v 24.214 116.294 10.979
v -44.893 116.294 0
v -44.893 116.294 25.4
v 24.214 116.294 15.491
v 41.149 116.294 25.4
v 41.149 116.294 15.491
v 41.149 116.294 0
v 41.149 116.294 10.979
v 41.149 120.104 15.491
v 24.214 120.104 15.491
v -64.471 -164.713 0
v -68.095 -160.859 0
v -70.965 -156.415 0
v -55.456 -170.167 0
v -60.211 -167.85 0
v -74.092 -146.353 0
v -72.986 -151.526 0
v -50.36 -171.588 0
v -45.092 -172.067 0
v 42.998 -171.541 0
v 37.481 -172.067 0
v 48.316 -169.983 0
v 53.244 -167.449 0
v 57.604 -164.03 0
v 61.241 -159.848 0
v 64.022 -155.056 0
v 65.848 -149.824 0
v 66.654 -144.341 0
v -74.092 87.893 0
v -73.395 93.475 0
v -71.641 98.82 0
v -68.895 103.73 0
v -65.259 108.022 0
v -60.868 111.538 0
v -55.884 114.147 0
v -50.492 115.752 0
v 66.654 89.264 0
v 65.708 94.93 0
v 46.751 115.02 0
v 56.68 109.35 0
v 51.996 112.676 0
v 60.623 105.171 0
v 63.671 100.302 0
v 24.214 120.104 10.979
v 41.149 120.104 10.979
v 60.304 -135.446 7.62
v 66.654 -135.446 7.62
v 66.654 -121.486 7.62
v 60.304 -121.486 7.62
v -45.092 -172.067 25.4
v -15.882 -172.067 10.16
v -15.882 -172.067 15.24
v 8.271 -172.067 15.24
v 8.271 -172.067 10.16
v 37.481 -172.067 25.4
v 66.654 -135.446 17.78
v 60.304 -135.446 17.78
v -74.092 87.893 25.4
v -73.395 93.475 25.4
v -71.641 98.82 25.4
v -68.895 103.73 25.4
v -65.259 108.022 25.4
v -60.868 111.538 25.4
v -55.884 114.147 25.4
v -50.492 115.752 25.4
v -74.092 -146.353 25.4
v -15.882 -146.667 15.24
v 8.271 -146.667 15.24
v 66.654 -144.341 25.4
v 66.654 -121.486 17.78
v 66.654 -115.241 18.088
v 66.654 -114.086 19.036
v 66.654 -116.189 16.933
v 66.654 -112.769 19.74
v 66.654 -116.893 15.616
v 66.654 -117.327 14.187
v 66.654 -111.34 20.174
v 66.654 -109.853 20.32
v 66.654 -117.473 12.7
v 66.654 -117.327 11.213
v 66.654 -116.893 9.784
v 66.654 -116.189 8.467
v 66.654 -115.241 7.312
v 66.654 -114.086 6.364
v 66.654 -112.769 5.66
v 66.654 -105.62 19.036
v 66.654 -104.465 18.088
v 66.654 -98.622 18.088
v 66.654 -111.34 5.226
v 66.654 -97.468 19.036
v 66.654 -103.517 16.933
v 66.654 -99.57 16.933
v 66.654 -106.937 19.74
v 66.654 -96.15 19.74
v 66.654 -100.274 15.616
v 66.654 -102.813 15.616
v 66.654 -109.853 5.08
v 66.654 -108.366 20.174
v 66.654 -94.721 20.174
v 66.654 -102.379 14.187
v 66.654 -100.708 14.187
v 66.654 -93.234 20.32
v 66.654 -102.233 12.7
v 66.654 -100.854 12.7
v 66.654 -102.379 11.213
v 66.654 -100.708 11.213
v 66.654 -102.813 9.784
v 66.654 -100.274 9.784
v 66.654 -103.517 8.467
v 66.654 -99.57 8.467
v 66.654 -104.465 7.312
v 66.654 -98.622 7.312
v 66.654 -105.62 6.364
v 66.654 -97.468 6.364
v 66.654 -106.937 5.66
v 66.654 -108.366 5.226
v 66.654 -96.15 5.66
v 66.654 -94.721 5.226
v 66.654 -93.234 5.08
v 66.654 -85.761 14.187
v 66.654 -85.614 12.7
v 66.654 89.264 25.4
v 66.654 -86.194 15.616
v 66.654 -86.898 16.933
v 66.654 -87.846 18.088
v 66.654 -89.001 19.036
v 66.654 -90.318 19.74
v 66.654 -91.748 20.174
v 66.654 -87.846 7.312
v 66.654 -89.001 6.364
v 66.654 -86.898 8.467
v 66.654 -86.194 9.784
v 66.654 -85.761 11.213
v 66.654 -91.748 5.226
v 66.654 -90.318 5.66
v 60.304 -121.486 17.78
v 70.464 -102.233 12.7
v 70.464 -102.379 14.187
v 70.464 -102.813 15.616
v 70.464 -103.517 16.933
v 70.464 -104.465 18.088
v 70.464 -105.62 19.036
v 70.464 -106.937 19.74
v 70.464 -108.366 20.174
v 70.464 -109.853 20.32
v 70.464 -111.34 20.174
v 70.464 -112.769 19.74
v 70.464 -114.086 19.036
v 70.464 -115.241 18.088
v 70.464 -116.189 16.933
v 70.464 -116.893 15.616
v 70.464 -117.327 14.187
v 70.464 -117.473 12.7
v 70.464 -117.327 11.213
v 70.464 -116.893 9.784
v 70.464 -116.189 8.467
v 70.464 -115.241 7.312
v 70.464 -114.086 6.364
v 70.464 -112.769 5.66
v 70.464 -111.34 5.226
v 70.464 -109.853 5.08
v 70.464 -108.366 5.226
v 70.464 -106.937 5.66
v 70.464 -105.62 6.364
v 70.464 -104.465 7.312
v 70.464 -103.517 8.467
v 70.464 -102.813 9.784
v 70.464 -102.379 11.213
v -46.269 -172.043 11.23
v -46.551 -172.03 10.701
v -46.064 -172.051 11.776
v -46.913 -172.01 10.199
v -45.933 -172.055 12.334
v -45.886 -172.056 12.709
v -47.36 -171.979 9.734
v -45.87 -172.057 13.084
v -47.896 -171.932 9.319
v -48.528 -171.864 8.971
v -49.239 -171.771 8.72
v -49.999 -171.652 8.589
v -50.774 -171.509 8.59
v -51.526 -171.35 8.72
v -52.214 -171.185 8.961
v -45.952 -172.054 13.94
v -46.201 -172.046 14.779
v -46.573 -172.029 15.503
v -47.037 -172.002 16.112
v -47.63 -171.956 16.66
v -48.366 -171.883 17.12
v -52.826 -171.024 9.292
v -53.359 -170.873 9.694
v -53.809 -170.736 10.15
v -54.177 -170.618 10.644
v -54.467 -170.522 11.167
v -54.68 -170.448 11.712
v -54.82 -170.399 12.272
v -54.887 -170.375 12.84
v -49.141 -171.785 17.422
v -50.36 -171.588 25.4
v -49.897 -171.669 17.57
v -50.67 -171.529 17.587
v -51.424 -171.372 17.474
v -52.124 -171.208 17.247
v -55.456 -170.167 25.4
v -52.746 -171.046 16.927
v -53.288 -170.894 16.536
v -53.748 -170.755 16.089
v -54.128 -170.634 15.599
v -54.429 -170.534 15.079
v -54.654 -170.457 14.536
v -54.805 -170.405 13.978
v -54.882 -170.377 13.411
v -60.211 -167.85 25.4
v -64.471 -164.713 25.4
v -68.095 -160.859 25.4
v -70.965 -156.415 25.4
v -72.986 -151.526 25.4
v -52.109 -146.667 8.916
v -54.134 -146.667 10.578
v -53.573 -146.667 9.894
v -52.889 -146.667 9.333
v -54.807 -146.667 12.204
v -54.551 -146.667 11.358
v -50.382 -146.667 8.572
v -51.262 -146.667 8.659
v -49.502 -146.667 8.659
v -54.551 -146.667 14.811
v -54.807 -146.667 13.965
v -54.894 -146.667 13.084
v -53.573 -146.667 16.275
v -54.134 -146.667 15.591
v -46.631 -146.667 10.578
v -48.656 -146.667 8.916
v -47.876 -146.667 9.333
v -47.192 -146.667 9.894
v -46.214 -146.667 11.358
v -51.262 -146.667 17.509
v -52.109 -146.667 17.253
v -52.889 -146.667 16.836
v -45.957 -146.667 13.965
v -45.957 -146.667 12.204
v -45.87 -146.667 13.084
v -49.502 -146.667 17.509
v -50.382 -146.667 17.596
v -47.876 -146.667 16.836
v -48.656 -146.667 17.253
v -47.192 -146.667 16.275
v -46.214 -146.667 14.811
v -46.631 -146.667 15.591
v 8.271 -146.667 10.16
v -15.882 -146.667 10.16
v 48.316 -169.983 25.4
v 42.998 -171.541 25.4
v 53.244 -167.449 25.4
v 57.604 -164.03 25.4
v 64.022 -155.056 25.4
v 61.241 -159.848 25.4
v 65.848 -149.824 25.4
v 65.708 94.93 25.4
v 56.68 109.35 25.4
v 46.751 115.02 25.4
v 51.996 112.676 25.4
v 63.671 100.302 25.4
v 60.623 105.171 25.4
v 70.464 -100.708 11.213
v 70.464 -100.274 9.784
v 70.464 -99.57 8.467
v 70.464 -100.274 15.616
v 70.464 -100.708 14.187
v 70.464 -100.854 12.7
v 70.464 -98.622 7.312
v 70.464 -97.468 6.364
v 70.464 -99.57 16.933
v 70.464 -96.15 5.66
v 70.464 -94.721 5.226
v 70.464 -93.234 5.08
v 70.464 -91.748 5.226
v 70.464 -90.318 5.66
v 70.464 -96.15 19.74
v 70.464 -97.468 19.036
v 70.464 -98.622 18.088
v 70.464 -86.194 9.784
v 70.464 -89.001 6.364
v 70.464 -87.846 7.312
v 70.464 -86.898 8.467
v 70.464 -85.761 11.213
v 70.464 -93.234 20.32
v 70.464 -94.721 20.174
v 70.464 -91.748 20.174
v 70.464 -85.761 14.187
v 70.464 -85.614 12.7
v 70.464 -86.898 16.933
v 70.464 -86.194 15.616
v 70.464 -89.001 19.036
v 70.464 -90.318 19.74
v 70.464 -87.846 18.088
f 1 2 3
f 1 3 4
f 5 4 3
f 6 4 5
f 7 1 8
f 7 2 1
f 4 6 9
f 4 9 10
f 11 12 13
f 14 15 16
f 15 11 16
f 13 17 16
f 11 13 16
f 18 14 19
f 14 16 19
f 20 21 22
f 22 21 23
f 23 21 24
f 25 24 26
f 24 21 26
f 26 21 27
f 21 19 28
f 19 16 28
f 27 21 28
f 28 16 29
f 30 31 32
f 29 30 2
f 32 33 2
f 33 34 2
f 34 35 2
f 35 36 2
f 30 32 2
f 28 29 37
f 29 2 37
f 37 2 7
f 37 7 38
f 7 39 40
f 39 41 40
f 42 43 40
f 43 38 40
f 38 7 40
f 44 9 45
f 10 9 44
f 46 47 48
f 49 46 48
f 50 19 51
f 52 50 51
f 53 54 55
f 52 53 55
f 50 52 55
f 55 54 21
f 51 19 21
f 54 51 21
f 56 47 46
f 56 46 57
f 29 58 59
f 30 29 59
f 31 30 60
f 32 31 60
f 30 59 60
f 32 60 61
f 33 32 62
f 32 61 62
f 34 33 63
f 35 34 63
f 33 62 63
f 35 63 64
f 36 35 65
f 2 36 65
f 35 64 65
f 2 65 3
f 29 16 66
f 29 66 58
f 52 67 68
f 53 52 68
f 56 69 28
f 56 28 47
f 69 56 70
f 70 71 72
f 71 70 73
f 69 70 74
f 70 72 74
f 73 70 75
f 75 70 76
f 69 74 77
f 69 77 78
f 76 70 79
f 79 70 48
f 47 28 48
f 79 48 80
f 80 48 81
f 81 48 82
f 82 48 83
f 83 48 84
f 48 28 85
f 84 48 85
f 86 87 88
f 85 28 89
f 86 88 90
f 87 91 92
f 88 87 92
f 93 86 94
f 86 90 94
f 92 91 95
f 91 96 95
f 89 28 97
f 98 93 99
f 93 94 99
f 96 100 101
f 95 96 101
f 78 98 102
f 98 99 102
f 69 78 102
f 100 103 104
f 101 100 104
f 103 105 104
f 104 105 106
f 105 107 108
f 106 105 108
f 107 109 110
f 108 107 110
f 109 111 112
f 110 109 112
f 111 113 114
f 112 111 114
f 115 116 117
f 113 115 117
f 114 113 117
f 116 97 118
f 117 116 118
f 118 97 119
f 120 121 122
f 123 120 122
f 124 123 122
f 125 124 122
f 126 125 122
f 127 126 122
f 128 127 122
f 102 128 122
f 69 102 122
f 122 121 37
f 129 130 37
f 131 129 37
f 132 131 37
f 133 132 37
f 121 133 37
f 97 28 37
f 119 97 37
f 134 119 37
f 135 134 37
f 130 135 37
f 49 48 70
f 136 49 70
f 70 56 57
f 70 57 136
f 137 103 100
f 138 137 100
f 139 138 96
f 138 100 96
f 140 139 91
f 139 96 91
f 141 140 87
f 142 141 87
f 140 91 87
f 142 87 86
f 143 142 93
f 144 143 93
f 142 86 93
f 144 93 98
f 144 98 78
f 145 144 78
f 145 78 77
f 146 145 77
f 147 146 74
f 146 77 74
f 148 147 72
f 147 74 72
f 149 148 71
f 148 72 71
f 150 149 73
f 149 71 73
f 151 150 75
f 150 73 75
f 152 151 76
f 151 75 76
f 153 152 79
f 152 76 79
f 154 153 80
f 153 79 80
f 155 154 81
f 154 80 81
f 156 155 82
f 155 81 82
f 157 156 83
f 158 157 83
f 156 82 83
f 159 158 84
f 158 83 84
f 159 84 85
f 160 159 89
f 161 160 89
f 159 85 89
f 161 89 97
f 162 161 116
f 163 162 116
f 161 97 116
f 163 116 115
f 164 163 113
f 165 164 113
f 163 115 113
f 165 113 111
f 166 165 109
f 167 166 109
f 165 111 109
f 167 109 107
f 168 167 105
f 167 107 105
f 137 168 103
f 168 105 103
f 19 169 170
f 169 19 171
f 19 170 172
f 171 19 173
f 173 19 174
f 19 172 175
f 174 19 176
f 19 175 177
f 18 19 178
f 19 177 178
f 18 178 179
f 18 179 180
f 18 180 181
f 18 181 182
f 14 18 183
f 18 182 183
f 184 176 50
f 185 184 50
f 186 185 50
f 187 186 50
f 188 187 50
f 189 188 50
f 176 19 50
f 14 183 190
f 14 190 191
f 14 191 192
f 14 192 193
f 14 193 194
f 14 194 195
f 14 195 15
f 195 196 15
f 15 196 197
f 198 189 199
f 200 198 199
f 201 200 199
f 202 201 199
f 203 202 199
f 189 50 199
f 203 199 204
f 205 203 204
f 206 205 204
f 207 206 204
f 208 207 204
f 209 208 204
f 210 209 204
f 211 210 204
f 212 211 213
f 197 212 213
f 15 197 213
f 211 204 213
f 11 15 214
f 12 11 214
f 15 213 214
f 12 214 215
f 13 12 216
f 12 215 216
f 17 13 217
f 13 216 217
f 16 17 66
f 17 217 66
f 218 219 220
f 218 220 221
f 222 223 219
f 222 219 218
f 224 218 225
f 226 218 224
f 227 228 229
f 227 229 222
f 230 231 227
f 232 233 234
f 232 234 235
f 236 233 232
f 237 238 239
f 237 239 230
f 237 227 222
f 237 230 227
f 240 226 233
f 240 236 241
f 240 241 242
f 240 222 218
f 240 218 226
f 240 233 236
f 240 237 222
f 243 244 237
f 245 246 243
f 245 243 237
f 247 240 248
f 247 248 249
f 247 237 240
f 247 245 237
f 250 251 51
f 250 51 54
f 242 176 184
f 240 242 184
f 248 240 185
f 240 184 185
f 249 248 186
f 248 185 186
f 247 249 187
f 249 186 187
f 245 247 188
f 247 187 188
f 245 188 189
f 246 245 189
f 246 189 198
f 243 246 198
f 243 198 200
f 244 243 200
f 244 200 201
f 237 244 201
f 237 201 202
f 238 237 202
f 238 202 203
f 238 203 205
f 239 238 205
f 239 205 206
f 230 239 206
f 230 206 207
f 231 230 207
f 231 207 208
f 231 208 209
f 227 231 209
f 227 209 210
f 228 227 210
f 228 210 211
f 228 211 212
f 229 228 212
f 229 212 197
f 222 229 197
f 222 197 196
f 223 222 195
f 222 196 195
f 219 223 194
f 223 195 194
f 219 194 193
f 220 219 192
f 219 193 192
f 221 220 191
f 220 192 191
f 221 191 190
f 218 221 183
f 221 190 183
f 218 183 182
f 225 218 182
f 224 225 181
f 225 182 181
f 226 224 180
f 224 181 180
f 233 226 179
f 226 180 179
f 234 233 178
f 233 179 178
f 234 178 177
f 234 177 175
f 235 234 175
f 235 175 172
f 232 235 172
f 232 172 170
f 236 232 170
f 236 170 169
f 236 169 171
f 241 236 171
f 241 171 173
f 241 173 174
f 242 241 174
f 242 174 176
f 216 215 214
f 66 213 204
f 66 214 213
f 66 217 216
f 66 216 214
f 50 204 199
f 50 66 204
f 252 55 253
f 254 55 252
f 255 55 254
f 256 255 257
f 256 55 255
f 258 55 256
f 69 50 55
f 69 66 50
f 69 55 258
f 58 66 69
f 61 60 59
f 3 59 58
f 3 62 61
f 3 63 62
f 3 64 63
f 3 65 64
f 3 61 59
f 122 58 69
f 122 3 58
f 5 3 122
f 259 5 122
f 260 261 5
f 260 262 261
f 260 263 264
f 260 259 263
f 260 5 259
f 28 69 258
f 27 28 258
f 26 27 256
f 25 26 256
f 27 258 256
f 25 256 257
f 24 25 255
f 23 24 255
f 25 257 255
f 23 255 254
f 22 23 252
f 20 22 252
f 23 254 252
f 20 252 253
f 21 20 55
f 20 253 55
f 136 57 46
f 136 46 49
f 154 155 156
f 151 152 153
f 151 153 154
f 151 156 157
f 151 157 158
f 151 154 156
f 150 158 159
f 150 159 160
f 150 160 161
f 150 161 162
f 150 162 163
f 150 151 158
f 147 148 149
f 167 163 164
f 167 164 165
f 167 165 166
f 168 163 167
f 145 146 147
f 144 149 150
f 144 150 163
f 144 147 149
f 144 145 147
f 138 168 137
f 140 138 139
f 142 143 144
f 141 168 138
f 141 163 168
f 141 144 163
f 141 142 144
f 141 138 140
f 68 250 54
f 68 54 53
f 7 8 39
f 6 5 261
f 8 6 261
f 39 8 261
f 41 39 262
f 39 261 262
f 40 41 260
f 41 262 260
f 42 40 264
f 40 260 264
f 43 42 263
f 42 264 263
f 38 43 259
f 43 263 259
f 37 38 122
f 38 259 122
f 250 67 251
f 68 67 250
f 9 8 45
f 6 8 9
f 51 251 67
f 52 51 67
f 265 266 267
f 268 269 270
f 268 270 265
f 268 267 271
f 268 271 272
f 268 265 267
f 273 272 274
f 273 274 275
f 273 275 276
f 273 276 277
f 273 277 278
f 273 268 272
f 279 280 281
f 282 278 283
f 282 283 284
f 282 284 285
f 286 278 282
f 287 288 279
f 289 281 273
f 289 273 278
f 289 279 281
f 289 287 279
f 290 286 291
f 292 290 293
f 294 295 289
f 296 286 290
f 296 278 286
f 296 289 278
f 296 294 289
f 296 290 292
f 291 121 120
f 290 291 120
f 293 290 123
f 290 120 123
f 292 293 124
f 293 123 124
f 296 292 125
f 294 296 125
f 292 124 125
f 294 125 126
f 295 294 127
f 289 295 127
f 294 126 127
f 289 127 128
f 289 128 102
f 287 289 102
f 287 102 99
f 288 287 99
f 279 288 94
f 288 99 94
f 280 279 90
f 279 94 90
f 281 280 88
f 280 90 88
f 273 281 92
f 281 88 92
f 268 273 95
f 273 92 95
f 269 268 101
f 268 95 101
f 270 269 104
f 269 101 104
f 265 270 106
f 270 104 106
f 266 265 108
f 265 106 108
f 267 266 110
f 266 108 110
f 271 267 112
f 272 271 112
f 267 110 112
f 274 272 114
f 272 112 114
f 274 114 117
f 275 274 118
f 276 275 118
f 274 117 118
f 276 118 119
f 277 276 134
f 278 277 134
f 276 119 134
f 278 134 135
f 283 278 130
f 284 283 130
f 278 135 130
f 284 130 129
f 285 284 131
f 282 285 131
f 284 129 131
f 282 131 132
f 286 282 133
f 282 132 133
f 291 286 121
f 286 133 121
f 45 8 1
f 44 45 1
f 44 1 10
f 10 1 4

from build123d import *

# Parameters (mm, degrees)
F0_W      = 140.7454609871
F0_H      = 288.360491395
F1_DEPTH  = 25.4
F4_DEPTH  = 25.4
F6_W      = 16.9358227252
F6_H      = 4.5118425041
F7_DEPTH  = 3.81
F8_W      = 13.9597124967
F8_H      = 10.16
F9_DEPTH  = 6.35
F8_R      = 7.62
F11_DEPTH = 3.81
F5_W      = 24.153170515
F5_H      = 5.08
F12_DEPTH = 25.4
F5_R      = 4.5118428767
F13_DEPTH = 25.4


with BuildPart() as f1:
    # F0 (on Top) → F1 (new body)
    with BuildSketch(Plane.XY):
        with Locations((-3.7190392613, -27.8867259622)):
            Rectangle(F0_W, F0_H)
    extrude(amount=F1_DEPTH)

    # F2 (on face) → F4 (cut)
    with BuildSketch(Plane.XY.offset(25.4)):
        with BuildLine():
            ThreePointArc((66.6536912322, -144.3410718666), (57.604458326, -164.0297686766), (37.4814176394, -172.0669716597))
            Line((37.4814176394, -172.0669716597), (66.6536912322, -172.0669716597))
            Line((66.6536912322, -172.0669716597), (66.6536912322, -144.3410718666))
        make_face()
        with BuildLine():
            Line((-74.0917697549, -172.0669716597), (-45.0917528756, -172.0669716597))
            ThreePointArc((-45.0917528756, -172.0669716597), (-64.4708824202, -164.7127131958), (-74.0917697549, -146.3531296941))
            Line((-74.0917697549, -146.3531296941), (-74.0917697549, -172.0669716597))
        make_face()
        with BuildLine():
            ThreePointArc((41.1493752002, 116.2935197353), (58.7544153268, 107.3576281035), (66.6536912322, 89.2637330754))
            Line((66.6536912322, 89.2637330754), (66.6536912322, 116.2935197353))
            Line((66.6536912322, 116.2935197353), (41.1493752002, 116.2935197353))
        make_face()
        with BuildLine():
            Line((-74.0917697549, 116.2935197353), (-74.0917697549, 87.8933618236))
            ThreePointArc((-74.0917697549, 87.8933618236), (-65.2592523832, 108.0224737135), (-44.8929982774, 116.2935197353))
            Line((-44.8929982774, 116.2935197353), (-74.0917697549, 116.2935197353))
        make_face()
    extrude(amount=-F4_DEPTH, mode=Mode.SUBTRACT)

    # F6 (on face) → F7 (join)
    with BuildSketch(Plane(origin=(0, 116.2935197353, 0), x_dir=(-1, 0, 0), z_dir=(0, 1, 0))):
        with Locations((-32.6814638376, 13.2347373292)):
            Rectangle(F6_W, F6_H)
    extrude(amount=F7_DEPTH)

    # F8 (on face) → F9 (cut)
    with BuildSketch(Plane.YZ.offset(66.6536912322)):
        with Locations((-128.4659260378, 12.7)):
            Rectangle(F8_W, F8_H)
    extrude(amount=-F9_DEPTH, mode=Mode.SUBTRACT)

    # F8 (on face) → F11 (join)
    with BuildSketch(Plane.YZ.offset(66.6536912322)):
        with Locations((-109.8529842751, 12.7)):
            Circle(F8_R)
        with Locations((-93.2342812741, 12.7)):
            Circle(F8_R)
    extrude(amount=F11_DEPTH)

    # F5 (on face) → F12 (cut)
    with BuildSketch(Plane.XZ.offset(172.0669716597)):
        with Locations((-3.8051676181, 12.7)):
            Rectangle(F5_W, F5_H)
    extrude(amount=-F12_DEPTH, mode=Mode.SUBTRACT)

    # F5 (on face) → F13 (cut)
    with BuildSketch(Plane.XZ.offset(172.0669716597)):
        with Locations((-50.3822378814, 13.0843427032)):
            Circle(F5_R)
    extrude(amount=-F13_DEPTH, mode=Mode.SUBTRACT)


solid = f1.part
